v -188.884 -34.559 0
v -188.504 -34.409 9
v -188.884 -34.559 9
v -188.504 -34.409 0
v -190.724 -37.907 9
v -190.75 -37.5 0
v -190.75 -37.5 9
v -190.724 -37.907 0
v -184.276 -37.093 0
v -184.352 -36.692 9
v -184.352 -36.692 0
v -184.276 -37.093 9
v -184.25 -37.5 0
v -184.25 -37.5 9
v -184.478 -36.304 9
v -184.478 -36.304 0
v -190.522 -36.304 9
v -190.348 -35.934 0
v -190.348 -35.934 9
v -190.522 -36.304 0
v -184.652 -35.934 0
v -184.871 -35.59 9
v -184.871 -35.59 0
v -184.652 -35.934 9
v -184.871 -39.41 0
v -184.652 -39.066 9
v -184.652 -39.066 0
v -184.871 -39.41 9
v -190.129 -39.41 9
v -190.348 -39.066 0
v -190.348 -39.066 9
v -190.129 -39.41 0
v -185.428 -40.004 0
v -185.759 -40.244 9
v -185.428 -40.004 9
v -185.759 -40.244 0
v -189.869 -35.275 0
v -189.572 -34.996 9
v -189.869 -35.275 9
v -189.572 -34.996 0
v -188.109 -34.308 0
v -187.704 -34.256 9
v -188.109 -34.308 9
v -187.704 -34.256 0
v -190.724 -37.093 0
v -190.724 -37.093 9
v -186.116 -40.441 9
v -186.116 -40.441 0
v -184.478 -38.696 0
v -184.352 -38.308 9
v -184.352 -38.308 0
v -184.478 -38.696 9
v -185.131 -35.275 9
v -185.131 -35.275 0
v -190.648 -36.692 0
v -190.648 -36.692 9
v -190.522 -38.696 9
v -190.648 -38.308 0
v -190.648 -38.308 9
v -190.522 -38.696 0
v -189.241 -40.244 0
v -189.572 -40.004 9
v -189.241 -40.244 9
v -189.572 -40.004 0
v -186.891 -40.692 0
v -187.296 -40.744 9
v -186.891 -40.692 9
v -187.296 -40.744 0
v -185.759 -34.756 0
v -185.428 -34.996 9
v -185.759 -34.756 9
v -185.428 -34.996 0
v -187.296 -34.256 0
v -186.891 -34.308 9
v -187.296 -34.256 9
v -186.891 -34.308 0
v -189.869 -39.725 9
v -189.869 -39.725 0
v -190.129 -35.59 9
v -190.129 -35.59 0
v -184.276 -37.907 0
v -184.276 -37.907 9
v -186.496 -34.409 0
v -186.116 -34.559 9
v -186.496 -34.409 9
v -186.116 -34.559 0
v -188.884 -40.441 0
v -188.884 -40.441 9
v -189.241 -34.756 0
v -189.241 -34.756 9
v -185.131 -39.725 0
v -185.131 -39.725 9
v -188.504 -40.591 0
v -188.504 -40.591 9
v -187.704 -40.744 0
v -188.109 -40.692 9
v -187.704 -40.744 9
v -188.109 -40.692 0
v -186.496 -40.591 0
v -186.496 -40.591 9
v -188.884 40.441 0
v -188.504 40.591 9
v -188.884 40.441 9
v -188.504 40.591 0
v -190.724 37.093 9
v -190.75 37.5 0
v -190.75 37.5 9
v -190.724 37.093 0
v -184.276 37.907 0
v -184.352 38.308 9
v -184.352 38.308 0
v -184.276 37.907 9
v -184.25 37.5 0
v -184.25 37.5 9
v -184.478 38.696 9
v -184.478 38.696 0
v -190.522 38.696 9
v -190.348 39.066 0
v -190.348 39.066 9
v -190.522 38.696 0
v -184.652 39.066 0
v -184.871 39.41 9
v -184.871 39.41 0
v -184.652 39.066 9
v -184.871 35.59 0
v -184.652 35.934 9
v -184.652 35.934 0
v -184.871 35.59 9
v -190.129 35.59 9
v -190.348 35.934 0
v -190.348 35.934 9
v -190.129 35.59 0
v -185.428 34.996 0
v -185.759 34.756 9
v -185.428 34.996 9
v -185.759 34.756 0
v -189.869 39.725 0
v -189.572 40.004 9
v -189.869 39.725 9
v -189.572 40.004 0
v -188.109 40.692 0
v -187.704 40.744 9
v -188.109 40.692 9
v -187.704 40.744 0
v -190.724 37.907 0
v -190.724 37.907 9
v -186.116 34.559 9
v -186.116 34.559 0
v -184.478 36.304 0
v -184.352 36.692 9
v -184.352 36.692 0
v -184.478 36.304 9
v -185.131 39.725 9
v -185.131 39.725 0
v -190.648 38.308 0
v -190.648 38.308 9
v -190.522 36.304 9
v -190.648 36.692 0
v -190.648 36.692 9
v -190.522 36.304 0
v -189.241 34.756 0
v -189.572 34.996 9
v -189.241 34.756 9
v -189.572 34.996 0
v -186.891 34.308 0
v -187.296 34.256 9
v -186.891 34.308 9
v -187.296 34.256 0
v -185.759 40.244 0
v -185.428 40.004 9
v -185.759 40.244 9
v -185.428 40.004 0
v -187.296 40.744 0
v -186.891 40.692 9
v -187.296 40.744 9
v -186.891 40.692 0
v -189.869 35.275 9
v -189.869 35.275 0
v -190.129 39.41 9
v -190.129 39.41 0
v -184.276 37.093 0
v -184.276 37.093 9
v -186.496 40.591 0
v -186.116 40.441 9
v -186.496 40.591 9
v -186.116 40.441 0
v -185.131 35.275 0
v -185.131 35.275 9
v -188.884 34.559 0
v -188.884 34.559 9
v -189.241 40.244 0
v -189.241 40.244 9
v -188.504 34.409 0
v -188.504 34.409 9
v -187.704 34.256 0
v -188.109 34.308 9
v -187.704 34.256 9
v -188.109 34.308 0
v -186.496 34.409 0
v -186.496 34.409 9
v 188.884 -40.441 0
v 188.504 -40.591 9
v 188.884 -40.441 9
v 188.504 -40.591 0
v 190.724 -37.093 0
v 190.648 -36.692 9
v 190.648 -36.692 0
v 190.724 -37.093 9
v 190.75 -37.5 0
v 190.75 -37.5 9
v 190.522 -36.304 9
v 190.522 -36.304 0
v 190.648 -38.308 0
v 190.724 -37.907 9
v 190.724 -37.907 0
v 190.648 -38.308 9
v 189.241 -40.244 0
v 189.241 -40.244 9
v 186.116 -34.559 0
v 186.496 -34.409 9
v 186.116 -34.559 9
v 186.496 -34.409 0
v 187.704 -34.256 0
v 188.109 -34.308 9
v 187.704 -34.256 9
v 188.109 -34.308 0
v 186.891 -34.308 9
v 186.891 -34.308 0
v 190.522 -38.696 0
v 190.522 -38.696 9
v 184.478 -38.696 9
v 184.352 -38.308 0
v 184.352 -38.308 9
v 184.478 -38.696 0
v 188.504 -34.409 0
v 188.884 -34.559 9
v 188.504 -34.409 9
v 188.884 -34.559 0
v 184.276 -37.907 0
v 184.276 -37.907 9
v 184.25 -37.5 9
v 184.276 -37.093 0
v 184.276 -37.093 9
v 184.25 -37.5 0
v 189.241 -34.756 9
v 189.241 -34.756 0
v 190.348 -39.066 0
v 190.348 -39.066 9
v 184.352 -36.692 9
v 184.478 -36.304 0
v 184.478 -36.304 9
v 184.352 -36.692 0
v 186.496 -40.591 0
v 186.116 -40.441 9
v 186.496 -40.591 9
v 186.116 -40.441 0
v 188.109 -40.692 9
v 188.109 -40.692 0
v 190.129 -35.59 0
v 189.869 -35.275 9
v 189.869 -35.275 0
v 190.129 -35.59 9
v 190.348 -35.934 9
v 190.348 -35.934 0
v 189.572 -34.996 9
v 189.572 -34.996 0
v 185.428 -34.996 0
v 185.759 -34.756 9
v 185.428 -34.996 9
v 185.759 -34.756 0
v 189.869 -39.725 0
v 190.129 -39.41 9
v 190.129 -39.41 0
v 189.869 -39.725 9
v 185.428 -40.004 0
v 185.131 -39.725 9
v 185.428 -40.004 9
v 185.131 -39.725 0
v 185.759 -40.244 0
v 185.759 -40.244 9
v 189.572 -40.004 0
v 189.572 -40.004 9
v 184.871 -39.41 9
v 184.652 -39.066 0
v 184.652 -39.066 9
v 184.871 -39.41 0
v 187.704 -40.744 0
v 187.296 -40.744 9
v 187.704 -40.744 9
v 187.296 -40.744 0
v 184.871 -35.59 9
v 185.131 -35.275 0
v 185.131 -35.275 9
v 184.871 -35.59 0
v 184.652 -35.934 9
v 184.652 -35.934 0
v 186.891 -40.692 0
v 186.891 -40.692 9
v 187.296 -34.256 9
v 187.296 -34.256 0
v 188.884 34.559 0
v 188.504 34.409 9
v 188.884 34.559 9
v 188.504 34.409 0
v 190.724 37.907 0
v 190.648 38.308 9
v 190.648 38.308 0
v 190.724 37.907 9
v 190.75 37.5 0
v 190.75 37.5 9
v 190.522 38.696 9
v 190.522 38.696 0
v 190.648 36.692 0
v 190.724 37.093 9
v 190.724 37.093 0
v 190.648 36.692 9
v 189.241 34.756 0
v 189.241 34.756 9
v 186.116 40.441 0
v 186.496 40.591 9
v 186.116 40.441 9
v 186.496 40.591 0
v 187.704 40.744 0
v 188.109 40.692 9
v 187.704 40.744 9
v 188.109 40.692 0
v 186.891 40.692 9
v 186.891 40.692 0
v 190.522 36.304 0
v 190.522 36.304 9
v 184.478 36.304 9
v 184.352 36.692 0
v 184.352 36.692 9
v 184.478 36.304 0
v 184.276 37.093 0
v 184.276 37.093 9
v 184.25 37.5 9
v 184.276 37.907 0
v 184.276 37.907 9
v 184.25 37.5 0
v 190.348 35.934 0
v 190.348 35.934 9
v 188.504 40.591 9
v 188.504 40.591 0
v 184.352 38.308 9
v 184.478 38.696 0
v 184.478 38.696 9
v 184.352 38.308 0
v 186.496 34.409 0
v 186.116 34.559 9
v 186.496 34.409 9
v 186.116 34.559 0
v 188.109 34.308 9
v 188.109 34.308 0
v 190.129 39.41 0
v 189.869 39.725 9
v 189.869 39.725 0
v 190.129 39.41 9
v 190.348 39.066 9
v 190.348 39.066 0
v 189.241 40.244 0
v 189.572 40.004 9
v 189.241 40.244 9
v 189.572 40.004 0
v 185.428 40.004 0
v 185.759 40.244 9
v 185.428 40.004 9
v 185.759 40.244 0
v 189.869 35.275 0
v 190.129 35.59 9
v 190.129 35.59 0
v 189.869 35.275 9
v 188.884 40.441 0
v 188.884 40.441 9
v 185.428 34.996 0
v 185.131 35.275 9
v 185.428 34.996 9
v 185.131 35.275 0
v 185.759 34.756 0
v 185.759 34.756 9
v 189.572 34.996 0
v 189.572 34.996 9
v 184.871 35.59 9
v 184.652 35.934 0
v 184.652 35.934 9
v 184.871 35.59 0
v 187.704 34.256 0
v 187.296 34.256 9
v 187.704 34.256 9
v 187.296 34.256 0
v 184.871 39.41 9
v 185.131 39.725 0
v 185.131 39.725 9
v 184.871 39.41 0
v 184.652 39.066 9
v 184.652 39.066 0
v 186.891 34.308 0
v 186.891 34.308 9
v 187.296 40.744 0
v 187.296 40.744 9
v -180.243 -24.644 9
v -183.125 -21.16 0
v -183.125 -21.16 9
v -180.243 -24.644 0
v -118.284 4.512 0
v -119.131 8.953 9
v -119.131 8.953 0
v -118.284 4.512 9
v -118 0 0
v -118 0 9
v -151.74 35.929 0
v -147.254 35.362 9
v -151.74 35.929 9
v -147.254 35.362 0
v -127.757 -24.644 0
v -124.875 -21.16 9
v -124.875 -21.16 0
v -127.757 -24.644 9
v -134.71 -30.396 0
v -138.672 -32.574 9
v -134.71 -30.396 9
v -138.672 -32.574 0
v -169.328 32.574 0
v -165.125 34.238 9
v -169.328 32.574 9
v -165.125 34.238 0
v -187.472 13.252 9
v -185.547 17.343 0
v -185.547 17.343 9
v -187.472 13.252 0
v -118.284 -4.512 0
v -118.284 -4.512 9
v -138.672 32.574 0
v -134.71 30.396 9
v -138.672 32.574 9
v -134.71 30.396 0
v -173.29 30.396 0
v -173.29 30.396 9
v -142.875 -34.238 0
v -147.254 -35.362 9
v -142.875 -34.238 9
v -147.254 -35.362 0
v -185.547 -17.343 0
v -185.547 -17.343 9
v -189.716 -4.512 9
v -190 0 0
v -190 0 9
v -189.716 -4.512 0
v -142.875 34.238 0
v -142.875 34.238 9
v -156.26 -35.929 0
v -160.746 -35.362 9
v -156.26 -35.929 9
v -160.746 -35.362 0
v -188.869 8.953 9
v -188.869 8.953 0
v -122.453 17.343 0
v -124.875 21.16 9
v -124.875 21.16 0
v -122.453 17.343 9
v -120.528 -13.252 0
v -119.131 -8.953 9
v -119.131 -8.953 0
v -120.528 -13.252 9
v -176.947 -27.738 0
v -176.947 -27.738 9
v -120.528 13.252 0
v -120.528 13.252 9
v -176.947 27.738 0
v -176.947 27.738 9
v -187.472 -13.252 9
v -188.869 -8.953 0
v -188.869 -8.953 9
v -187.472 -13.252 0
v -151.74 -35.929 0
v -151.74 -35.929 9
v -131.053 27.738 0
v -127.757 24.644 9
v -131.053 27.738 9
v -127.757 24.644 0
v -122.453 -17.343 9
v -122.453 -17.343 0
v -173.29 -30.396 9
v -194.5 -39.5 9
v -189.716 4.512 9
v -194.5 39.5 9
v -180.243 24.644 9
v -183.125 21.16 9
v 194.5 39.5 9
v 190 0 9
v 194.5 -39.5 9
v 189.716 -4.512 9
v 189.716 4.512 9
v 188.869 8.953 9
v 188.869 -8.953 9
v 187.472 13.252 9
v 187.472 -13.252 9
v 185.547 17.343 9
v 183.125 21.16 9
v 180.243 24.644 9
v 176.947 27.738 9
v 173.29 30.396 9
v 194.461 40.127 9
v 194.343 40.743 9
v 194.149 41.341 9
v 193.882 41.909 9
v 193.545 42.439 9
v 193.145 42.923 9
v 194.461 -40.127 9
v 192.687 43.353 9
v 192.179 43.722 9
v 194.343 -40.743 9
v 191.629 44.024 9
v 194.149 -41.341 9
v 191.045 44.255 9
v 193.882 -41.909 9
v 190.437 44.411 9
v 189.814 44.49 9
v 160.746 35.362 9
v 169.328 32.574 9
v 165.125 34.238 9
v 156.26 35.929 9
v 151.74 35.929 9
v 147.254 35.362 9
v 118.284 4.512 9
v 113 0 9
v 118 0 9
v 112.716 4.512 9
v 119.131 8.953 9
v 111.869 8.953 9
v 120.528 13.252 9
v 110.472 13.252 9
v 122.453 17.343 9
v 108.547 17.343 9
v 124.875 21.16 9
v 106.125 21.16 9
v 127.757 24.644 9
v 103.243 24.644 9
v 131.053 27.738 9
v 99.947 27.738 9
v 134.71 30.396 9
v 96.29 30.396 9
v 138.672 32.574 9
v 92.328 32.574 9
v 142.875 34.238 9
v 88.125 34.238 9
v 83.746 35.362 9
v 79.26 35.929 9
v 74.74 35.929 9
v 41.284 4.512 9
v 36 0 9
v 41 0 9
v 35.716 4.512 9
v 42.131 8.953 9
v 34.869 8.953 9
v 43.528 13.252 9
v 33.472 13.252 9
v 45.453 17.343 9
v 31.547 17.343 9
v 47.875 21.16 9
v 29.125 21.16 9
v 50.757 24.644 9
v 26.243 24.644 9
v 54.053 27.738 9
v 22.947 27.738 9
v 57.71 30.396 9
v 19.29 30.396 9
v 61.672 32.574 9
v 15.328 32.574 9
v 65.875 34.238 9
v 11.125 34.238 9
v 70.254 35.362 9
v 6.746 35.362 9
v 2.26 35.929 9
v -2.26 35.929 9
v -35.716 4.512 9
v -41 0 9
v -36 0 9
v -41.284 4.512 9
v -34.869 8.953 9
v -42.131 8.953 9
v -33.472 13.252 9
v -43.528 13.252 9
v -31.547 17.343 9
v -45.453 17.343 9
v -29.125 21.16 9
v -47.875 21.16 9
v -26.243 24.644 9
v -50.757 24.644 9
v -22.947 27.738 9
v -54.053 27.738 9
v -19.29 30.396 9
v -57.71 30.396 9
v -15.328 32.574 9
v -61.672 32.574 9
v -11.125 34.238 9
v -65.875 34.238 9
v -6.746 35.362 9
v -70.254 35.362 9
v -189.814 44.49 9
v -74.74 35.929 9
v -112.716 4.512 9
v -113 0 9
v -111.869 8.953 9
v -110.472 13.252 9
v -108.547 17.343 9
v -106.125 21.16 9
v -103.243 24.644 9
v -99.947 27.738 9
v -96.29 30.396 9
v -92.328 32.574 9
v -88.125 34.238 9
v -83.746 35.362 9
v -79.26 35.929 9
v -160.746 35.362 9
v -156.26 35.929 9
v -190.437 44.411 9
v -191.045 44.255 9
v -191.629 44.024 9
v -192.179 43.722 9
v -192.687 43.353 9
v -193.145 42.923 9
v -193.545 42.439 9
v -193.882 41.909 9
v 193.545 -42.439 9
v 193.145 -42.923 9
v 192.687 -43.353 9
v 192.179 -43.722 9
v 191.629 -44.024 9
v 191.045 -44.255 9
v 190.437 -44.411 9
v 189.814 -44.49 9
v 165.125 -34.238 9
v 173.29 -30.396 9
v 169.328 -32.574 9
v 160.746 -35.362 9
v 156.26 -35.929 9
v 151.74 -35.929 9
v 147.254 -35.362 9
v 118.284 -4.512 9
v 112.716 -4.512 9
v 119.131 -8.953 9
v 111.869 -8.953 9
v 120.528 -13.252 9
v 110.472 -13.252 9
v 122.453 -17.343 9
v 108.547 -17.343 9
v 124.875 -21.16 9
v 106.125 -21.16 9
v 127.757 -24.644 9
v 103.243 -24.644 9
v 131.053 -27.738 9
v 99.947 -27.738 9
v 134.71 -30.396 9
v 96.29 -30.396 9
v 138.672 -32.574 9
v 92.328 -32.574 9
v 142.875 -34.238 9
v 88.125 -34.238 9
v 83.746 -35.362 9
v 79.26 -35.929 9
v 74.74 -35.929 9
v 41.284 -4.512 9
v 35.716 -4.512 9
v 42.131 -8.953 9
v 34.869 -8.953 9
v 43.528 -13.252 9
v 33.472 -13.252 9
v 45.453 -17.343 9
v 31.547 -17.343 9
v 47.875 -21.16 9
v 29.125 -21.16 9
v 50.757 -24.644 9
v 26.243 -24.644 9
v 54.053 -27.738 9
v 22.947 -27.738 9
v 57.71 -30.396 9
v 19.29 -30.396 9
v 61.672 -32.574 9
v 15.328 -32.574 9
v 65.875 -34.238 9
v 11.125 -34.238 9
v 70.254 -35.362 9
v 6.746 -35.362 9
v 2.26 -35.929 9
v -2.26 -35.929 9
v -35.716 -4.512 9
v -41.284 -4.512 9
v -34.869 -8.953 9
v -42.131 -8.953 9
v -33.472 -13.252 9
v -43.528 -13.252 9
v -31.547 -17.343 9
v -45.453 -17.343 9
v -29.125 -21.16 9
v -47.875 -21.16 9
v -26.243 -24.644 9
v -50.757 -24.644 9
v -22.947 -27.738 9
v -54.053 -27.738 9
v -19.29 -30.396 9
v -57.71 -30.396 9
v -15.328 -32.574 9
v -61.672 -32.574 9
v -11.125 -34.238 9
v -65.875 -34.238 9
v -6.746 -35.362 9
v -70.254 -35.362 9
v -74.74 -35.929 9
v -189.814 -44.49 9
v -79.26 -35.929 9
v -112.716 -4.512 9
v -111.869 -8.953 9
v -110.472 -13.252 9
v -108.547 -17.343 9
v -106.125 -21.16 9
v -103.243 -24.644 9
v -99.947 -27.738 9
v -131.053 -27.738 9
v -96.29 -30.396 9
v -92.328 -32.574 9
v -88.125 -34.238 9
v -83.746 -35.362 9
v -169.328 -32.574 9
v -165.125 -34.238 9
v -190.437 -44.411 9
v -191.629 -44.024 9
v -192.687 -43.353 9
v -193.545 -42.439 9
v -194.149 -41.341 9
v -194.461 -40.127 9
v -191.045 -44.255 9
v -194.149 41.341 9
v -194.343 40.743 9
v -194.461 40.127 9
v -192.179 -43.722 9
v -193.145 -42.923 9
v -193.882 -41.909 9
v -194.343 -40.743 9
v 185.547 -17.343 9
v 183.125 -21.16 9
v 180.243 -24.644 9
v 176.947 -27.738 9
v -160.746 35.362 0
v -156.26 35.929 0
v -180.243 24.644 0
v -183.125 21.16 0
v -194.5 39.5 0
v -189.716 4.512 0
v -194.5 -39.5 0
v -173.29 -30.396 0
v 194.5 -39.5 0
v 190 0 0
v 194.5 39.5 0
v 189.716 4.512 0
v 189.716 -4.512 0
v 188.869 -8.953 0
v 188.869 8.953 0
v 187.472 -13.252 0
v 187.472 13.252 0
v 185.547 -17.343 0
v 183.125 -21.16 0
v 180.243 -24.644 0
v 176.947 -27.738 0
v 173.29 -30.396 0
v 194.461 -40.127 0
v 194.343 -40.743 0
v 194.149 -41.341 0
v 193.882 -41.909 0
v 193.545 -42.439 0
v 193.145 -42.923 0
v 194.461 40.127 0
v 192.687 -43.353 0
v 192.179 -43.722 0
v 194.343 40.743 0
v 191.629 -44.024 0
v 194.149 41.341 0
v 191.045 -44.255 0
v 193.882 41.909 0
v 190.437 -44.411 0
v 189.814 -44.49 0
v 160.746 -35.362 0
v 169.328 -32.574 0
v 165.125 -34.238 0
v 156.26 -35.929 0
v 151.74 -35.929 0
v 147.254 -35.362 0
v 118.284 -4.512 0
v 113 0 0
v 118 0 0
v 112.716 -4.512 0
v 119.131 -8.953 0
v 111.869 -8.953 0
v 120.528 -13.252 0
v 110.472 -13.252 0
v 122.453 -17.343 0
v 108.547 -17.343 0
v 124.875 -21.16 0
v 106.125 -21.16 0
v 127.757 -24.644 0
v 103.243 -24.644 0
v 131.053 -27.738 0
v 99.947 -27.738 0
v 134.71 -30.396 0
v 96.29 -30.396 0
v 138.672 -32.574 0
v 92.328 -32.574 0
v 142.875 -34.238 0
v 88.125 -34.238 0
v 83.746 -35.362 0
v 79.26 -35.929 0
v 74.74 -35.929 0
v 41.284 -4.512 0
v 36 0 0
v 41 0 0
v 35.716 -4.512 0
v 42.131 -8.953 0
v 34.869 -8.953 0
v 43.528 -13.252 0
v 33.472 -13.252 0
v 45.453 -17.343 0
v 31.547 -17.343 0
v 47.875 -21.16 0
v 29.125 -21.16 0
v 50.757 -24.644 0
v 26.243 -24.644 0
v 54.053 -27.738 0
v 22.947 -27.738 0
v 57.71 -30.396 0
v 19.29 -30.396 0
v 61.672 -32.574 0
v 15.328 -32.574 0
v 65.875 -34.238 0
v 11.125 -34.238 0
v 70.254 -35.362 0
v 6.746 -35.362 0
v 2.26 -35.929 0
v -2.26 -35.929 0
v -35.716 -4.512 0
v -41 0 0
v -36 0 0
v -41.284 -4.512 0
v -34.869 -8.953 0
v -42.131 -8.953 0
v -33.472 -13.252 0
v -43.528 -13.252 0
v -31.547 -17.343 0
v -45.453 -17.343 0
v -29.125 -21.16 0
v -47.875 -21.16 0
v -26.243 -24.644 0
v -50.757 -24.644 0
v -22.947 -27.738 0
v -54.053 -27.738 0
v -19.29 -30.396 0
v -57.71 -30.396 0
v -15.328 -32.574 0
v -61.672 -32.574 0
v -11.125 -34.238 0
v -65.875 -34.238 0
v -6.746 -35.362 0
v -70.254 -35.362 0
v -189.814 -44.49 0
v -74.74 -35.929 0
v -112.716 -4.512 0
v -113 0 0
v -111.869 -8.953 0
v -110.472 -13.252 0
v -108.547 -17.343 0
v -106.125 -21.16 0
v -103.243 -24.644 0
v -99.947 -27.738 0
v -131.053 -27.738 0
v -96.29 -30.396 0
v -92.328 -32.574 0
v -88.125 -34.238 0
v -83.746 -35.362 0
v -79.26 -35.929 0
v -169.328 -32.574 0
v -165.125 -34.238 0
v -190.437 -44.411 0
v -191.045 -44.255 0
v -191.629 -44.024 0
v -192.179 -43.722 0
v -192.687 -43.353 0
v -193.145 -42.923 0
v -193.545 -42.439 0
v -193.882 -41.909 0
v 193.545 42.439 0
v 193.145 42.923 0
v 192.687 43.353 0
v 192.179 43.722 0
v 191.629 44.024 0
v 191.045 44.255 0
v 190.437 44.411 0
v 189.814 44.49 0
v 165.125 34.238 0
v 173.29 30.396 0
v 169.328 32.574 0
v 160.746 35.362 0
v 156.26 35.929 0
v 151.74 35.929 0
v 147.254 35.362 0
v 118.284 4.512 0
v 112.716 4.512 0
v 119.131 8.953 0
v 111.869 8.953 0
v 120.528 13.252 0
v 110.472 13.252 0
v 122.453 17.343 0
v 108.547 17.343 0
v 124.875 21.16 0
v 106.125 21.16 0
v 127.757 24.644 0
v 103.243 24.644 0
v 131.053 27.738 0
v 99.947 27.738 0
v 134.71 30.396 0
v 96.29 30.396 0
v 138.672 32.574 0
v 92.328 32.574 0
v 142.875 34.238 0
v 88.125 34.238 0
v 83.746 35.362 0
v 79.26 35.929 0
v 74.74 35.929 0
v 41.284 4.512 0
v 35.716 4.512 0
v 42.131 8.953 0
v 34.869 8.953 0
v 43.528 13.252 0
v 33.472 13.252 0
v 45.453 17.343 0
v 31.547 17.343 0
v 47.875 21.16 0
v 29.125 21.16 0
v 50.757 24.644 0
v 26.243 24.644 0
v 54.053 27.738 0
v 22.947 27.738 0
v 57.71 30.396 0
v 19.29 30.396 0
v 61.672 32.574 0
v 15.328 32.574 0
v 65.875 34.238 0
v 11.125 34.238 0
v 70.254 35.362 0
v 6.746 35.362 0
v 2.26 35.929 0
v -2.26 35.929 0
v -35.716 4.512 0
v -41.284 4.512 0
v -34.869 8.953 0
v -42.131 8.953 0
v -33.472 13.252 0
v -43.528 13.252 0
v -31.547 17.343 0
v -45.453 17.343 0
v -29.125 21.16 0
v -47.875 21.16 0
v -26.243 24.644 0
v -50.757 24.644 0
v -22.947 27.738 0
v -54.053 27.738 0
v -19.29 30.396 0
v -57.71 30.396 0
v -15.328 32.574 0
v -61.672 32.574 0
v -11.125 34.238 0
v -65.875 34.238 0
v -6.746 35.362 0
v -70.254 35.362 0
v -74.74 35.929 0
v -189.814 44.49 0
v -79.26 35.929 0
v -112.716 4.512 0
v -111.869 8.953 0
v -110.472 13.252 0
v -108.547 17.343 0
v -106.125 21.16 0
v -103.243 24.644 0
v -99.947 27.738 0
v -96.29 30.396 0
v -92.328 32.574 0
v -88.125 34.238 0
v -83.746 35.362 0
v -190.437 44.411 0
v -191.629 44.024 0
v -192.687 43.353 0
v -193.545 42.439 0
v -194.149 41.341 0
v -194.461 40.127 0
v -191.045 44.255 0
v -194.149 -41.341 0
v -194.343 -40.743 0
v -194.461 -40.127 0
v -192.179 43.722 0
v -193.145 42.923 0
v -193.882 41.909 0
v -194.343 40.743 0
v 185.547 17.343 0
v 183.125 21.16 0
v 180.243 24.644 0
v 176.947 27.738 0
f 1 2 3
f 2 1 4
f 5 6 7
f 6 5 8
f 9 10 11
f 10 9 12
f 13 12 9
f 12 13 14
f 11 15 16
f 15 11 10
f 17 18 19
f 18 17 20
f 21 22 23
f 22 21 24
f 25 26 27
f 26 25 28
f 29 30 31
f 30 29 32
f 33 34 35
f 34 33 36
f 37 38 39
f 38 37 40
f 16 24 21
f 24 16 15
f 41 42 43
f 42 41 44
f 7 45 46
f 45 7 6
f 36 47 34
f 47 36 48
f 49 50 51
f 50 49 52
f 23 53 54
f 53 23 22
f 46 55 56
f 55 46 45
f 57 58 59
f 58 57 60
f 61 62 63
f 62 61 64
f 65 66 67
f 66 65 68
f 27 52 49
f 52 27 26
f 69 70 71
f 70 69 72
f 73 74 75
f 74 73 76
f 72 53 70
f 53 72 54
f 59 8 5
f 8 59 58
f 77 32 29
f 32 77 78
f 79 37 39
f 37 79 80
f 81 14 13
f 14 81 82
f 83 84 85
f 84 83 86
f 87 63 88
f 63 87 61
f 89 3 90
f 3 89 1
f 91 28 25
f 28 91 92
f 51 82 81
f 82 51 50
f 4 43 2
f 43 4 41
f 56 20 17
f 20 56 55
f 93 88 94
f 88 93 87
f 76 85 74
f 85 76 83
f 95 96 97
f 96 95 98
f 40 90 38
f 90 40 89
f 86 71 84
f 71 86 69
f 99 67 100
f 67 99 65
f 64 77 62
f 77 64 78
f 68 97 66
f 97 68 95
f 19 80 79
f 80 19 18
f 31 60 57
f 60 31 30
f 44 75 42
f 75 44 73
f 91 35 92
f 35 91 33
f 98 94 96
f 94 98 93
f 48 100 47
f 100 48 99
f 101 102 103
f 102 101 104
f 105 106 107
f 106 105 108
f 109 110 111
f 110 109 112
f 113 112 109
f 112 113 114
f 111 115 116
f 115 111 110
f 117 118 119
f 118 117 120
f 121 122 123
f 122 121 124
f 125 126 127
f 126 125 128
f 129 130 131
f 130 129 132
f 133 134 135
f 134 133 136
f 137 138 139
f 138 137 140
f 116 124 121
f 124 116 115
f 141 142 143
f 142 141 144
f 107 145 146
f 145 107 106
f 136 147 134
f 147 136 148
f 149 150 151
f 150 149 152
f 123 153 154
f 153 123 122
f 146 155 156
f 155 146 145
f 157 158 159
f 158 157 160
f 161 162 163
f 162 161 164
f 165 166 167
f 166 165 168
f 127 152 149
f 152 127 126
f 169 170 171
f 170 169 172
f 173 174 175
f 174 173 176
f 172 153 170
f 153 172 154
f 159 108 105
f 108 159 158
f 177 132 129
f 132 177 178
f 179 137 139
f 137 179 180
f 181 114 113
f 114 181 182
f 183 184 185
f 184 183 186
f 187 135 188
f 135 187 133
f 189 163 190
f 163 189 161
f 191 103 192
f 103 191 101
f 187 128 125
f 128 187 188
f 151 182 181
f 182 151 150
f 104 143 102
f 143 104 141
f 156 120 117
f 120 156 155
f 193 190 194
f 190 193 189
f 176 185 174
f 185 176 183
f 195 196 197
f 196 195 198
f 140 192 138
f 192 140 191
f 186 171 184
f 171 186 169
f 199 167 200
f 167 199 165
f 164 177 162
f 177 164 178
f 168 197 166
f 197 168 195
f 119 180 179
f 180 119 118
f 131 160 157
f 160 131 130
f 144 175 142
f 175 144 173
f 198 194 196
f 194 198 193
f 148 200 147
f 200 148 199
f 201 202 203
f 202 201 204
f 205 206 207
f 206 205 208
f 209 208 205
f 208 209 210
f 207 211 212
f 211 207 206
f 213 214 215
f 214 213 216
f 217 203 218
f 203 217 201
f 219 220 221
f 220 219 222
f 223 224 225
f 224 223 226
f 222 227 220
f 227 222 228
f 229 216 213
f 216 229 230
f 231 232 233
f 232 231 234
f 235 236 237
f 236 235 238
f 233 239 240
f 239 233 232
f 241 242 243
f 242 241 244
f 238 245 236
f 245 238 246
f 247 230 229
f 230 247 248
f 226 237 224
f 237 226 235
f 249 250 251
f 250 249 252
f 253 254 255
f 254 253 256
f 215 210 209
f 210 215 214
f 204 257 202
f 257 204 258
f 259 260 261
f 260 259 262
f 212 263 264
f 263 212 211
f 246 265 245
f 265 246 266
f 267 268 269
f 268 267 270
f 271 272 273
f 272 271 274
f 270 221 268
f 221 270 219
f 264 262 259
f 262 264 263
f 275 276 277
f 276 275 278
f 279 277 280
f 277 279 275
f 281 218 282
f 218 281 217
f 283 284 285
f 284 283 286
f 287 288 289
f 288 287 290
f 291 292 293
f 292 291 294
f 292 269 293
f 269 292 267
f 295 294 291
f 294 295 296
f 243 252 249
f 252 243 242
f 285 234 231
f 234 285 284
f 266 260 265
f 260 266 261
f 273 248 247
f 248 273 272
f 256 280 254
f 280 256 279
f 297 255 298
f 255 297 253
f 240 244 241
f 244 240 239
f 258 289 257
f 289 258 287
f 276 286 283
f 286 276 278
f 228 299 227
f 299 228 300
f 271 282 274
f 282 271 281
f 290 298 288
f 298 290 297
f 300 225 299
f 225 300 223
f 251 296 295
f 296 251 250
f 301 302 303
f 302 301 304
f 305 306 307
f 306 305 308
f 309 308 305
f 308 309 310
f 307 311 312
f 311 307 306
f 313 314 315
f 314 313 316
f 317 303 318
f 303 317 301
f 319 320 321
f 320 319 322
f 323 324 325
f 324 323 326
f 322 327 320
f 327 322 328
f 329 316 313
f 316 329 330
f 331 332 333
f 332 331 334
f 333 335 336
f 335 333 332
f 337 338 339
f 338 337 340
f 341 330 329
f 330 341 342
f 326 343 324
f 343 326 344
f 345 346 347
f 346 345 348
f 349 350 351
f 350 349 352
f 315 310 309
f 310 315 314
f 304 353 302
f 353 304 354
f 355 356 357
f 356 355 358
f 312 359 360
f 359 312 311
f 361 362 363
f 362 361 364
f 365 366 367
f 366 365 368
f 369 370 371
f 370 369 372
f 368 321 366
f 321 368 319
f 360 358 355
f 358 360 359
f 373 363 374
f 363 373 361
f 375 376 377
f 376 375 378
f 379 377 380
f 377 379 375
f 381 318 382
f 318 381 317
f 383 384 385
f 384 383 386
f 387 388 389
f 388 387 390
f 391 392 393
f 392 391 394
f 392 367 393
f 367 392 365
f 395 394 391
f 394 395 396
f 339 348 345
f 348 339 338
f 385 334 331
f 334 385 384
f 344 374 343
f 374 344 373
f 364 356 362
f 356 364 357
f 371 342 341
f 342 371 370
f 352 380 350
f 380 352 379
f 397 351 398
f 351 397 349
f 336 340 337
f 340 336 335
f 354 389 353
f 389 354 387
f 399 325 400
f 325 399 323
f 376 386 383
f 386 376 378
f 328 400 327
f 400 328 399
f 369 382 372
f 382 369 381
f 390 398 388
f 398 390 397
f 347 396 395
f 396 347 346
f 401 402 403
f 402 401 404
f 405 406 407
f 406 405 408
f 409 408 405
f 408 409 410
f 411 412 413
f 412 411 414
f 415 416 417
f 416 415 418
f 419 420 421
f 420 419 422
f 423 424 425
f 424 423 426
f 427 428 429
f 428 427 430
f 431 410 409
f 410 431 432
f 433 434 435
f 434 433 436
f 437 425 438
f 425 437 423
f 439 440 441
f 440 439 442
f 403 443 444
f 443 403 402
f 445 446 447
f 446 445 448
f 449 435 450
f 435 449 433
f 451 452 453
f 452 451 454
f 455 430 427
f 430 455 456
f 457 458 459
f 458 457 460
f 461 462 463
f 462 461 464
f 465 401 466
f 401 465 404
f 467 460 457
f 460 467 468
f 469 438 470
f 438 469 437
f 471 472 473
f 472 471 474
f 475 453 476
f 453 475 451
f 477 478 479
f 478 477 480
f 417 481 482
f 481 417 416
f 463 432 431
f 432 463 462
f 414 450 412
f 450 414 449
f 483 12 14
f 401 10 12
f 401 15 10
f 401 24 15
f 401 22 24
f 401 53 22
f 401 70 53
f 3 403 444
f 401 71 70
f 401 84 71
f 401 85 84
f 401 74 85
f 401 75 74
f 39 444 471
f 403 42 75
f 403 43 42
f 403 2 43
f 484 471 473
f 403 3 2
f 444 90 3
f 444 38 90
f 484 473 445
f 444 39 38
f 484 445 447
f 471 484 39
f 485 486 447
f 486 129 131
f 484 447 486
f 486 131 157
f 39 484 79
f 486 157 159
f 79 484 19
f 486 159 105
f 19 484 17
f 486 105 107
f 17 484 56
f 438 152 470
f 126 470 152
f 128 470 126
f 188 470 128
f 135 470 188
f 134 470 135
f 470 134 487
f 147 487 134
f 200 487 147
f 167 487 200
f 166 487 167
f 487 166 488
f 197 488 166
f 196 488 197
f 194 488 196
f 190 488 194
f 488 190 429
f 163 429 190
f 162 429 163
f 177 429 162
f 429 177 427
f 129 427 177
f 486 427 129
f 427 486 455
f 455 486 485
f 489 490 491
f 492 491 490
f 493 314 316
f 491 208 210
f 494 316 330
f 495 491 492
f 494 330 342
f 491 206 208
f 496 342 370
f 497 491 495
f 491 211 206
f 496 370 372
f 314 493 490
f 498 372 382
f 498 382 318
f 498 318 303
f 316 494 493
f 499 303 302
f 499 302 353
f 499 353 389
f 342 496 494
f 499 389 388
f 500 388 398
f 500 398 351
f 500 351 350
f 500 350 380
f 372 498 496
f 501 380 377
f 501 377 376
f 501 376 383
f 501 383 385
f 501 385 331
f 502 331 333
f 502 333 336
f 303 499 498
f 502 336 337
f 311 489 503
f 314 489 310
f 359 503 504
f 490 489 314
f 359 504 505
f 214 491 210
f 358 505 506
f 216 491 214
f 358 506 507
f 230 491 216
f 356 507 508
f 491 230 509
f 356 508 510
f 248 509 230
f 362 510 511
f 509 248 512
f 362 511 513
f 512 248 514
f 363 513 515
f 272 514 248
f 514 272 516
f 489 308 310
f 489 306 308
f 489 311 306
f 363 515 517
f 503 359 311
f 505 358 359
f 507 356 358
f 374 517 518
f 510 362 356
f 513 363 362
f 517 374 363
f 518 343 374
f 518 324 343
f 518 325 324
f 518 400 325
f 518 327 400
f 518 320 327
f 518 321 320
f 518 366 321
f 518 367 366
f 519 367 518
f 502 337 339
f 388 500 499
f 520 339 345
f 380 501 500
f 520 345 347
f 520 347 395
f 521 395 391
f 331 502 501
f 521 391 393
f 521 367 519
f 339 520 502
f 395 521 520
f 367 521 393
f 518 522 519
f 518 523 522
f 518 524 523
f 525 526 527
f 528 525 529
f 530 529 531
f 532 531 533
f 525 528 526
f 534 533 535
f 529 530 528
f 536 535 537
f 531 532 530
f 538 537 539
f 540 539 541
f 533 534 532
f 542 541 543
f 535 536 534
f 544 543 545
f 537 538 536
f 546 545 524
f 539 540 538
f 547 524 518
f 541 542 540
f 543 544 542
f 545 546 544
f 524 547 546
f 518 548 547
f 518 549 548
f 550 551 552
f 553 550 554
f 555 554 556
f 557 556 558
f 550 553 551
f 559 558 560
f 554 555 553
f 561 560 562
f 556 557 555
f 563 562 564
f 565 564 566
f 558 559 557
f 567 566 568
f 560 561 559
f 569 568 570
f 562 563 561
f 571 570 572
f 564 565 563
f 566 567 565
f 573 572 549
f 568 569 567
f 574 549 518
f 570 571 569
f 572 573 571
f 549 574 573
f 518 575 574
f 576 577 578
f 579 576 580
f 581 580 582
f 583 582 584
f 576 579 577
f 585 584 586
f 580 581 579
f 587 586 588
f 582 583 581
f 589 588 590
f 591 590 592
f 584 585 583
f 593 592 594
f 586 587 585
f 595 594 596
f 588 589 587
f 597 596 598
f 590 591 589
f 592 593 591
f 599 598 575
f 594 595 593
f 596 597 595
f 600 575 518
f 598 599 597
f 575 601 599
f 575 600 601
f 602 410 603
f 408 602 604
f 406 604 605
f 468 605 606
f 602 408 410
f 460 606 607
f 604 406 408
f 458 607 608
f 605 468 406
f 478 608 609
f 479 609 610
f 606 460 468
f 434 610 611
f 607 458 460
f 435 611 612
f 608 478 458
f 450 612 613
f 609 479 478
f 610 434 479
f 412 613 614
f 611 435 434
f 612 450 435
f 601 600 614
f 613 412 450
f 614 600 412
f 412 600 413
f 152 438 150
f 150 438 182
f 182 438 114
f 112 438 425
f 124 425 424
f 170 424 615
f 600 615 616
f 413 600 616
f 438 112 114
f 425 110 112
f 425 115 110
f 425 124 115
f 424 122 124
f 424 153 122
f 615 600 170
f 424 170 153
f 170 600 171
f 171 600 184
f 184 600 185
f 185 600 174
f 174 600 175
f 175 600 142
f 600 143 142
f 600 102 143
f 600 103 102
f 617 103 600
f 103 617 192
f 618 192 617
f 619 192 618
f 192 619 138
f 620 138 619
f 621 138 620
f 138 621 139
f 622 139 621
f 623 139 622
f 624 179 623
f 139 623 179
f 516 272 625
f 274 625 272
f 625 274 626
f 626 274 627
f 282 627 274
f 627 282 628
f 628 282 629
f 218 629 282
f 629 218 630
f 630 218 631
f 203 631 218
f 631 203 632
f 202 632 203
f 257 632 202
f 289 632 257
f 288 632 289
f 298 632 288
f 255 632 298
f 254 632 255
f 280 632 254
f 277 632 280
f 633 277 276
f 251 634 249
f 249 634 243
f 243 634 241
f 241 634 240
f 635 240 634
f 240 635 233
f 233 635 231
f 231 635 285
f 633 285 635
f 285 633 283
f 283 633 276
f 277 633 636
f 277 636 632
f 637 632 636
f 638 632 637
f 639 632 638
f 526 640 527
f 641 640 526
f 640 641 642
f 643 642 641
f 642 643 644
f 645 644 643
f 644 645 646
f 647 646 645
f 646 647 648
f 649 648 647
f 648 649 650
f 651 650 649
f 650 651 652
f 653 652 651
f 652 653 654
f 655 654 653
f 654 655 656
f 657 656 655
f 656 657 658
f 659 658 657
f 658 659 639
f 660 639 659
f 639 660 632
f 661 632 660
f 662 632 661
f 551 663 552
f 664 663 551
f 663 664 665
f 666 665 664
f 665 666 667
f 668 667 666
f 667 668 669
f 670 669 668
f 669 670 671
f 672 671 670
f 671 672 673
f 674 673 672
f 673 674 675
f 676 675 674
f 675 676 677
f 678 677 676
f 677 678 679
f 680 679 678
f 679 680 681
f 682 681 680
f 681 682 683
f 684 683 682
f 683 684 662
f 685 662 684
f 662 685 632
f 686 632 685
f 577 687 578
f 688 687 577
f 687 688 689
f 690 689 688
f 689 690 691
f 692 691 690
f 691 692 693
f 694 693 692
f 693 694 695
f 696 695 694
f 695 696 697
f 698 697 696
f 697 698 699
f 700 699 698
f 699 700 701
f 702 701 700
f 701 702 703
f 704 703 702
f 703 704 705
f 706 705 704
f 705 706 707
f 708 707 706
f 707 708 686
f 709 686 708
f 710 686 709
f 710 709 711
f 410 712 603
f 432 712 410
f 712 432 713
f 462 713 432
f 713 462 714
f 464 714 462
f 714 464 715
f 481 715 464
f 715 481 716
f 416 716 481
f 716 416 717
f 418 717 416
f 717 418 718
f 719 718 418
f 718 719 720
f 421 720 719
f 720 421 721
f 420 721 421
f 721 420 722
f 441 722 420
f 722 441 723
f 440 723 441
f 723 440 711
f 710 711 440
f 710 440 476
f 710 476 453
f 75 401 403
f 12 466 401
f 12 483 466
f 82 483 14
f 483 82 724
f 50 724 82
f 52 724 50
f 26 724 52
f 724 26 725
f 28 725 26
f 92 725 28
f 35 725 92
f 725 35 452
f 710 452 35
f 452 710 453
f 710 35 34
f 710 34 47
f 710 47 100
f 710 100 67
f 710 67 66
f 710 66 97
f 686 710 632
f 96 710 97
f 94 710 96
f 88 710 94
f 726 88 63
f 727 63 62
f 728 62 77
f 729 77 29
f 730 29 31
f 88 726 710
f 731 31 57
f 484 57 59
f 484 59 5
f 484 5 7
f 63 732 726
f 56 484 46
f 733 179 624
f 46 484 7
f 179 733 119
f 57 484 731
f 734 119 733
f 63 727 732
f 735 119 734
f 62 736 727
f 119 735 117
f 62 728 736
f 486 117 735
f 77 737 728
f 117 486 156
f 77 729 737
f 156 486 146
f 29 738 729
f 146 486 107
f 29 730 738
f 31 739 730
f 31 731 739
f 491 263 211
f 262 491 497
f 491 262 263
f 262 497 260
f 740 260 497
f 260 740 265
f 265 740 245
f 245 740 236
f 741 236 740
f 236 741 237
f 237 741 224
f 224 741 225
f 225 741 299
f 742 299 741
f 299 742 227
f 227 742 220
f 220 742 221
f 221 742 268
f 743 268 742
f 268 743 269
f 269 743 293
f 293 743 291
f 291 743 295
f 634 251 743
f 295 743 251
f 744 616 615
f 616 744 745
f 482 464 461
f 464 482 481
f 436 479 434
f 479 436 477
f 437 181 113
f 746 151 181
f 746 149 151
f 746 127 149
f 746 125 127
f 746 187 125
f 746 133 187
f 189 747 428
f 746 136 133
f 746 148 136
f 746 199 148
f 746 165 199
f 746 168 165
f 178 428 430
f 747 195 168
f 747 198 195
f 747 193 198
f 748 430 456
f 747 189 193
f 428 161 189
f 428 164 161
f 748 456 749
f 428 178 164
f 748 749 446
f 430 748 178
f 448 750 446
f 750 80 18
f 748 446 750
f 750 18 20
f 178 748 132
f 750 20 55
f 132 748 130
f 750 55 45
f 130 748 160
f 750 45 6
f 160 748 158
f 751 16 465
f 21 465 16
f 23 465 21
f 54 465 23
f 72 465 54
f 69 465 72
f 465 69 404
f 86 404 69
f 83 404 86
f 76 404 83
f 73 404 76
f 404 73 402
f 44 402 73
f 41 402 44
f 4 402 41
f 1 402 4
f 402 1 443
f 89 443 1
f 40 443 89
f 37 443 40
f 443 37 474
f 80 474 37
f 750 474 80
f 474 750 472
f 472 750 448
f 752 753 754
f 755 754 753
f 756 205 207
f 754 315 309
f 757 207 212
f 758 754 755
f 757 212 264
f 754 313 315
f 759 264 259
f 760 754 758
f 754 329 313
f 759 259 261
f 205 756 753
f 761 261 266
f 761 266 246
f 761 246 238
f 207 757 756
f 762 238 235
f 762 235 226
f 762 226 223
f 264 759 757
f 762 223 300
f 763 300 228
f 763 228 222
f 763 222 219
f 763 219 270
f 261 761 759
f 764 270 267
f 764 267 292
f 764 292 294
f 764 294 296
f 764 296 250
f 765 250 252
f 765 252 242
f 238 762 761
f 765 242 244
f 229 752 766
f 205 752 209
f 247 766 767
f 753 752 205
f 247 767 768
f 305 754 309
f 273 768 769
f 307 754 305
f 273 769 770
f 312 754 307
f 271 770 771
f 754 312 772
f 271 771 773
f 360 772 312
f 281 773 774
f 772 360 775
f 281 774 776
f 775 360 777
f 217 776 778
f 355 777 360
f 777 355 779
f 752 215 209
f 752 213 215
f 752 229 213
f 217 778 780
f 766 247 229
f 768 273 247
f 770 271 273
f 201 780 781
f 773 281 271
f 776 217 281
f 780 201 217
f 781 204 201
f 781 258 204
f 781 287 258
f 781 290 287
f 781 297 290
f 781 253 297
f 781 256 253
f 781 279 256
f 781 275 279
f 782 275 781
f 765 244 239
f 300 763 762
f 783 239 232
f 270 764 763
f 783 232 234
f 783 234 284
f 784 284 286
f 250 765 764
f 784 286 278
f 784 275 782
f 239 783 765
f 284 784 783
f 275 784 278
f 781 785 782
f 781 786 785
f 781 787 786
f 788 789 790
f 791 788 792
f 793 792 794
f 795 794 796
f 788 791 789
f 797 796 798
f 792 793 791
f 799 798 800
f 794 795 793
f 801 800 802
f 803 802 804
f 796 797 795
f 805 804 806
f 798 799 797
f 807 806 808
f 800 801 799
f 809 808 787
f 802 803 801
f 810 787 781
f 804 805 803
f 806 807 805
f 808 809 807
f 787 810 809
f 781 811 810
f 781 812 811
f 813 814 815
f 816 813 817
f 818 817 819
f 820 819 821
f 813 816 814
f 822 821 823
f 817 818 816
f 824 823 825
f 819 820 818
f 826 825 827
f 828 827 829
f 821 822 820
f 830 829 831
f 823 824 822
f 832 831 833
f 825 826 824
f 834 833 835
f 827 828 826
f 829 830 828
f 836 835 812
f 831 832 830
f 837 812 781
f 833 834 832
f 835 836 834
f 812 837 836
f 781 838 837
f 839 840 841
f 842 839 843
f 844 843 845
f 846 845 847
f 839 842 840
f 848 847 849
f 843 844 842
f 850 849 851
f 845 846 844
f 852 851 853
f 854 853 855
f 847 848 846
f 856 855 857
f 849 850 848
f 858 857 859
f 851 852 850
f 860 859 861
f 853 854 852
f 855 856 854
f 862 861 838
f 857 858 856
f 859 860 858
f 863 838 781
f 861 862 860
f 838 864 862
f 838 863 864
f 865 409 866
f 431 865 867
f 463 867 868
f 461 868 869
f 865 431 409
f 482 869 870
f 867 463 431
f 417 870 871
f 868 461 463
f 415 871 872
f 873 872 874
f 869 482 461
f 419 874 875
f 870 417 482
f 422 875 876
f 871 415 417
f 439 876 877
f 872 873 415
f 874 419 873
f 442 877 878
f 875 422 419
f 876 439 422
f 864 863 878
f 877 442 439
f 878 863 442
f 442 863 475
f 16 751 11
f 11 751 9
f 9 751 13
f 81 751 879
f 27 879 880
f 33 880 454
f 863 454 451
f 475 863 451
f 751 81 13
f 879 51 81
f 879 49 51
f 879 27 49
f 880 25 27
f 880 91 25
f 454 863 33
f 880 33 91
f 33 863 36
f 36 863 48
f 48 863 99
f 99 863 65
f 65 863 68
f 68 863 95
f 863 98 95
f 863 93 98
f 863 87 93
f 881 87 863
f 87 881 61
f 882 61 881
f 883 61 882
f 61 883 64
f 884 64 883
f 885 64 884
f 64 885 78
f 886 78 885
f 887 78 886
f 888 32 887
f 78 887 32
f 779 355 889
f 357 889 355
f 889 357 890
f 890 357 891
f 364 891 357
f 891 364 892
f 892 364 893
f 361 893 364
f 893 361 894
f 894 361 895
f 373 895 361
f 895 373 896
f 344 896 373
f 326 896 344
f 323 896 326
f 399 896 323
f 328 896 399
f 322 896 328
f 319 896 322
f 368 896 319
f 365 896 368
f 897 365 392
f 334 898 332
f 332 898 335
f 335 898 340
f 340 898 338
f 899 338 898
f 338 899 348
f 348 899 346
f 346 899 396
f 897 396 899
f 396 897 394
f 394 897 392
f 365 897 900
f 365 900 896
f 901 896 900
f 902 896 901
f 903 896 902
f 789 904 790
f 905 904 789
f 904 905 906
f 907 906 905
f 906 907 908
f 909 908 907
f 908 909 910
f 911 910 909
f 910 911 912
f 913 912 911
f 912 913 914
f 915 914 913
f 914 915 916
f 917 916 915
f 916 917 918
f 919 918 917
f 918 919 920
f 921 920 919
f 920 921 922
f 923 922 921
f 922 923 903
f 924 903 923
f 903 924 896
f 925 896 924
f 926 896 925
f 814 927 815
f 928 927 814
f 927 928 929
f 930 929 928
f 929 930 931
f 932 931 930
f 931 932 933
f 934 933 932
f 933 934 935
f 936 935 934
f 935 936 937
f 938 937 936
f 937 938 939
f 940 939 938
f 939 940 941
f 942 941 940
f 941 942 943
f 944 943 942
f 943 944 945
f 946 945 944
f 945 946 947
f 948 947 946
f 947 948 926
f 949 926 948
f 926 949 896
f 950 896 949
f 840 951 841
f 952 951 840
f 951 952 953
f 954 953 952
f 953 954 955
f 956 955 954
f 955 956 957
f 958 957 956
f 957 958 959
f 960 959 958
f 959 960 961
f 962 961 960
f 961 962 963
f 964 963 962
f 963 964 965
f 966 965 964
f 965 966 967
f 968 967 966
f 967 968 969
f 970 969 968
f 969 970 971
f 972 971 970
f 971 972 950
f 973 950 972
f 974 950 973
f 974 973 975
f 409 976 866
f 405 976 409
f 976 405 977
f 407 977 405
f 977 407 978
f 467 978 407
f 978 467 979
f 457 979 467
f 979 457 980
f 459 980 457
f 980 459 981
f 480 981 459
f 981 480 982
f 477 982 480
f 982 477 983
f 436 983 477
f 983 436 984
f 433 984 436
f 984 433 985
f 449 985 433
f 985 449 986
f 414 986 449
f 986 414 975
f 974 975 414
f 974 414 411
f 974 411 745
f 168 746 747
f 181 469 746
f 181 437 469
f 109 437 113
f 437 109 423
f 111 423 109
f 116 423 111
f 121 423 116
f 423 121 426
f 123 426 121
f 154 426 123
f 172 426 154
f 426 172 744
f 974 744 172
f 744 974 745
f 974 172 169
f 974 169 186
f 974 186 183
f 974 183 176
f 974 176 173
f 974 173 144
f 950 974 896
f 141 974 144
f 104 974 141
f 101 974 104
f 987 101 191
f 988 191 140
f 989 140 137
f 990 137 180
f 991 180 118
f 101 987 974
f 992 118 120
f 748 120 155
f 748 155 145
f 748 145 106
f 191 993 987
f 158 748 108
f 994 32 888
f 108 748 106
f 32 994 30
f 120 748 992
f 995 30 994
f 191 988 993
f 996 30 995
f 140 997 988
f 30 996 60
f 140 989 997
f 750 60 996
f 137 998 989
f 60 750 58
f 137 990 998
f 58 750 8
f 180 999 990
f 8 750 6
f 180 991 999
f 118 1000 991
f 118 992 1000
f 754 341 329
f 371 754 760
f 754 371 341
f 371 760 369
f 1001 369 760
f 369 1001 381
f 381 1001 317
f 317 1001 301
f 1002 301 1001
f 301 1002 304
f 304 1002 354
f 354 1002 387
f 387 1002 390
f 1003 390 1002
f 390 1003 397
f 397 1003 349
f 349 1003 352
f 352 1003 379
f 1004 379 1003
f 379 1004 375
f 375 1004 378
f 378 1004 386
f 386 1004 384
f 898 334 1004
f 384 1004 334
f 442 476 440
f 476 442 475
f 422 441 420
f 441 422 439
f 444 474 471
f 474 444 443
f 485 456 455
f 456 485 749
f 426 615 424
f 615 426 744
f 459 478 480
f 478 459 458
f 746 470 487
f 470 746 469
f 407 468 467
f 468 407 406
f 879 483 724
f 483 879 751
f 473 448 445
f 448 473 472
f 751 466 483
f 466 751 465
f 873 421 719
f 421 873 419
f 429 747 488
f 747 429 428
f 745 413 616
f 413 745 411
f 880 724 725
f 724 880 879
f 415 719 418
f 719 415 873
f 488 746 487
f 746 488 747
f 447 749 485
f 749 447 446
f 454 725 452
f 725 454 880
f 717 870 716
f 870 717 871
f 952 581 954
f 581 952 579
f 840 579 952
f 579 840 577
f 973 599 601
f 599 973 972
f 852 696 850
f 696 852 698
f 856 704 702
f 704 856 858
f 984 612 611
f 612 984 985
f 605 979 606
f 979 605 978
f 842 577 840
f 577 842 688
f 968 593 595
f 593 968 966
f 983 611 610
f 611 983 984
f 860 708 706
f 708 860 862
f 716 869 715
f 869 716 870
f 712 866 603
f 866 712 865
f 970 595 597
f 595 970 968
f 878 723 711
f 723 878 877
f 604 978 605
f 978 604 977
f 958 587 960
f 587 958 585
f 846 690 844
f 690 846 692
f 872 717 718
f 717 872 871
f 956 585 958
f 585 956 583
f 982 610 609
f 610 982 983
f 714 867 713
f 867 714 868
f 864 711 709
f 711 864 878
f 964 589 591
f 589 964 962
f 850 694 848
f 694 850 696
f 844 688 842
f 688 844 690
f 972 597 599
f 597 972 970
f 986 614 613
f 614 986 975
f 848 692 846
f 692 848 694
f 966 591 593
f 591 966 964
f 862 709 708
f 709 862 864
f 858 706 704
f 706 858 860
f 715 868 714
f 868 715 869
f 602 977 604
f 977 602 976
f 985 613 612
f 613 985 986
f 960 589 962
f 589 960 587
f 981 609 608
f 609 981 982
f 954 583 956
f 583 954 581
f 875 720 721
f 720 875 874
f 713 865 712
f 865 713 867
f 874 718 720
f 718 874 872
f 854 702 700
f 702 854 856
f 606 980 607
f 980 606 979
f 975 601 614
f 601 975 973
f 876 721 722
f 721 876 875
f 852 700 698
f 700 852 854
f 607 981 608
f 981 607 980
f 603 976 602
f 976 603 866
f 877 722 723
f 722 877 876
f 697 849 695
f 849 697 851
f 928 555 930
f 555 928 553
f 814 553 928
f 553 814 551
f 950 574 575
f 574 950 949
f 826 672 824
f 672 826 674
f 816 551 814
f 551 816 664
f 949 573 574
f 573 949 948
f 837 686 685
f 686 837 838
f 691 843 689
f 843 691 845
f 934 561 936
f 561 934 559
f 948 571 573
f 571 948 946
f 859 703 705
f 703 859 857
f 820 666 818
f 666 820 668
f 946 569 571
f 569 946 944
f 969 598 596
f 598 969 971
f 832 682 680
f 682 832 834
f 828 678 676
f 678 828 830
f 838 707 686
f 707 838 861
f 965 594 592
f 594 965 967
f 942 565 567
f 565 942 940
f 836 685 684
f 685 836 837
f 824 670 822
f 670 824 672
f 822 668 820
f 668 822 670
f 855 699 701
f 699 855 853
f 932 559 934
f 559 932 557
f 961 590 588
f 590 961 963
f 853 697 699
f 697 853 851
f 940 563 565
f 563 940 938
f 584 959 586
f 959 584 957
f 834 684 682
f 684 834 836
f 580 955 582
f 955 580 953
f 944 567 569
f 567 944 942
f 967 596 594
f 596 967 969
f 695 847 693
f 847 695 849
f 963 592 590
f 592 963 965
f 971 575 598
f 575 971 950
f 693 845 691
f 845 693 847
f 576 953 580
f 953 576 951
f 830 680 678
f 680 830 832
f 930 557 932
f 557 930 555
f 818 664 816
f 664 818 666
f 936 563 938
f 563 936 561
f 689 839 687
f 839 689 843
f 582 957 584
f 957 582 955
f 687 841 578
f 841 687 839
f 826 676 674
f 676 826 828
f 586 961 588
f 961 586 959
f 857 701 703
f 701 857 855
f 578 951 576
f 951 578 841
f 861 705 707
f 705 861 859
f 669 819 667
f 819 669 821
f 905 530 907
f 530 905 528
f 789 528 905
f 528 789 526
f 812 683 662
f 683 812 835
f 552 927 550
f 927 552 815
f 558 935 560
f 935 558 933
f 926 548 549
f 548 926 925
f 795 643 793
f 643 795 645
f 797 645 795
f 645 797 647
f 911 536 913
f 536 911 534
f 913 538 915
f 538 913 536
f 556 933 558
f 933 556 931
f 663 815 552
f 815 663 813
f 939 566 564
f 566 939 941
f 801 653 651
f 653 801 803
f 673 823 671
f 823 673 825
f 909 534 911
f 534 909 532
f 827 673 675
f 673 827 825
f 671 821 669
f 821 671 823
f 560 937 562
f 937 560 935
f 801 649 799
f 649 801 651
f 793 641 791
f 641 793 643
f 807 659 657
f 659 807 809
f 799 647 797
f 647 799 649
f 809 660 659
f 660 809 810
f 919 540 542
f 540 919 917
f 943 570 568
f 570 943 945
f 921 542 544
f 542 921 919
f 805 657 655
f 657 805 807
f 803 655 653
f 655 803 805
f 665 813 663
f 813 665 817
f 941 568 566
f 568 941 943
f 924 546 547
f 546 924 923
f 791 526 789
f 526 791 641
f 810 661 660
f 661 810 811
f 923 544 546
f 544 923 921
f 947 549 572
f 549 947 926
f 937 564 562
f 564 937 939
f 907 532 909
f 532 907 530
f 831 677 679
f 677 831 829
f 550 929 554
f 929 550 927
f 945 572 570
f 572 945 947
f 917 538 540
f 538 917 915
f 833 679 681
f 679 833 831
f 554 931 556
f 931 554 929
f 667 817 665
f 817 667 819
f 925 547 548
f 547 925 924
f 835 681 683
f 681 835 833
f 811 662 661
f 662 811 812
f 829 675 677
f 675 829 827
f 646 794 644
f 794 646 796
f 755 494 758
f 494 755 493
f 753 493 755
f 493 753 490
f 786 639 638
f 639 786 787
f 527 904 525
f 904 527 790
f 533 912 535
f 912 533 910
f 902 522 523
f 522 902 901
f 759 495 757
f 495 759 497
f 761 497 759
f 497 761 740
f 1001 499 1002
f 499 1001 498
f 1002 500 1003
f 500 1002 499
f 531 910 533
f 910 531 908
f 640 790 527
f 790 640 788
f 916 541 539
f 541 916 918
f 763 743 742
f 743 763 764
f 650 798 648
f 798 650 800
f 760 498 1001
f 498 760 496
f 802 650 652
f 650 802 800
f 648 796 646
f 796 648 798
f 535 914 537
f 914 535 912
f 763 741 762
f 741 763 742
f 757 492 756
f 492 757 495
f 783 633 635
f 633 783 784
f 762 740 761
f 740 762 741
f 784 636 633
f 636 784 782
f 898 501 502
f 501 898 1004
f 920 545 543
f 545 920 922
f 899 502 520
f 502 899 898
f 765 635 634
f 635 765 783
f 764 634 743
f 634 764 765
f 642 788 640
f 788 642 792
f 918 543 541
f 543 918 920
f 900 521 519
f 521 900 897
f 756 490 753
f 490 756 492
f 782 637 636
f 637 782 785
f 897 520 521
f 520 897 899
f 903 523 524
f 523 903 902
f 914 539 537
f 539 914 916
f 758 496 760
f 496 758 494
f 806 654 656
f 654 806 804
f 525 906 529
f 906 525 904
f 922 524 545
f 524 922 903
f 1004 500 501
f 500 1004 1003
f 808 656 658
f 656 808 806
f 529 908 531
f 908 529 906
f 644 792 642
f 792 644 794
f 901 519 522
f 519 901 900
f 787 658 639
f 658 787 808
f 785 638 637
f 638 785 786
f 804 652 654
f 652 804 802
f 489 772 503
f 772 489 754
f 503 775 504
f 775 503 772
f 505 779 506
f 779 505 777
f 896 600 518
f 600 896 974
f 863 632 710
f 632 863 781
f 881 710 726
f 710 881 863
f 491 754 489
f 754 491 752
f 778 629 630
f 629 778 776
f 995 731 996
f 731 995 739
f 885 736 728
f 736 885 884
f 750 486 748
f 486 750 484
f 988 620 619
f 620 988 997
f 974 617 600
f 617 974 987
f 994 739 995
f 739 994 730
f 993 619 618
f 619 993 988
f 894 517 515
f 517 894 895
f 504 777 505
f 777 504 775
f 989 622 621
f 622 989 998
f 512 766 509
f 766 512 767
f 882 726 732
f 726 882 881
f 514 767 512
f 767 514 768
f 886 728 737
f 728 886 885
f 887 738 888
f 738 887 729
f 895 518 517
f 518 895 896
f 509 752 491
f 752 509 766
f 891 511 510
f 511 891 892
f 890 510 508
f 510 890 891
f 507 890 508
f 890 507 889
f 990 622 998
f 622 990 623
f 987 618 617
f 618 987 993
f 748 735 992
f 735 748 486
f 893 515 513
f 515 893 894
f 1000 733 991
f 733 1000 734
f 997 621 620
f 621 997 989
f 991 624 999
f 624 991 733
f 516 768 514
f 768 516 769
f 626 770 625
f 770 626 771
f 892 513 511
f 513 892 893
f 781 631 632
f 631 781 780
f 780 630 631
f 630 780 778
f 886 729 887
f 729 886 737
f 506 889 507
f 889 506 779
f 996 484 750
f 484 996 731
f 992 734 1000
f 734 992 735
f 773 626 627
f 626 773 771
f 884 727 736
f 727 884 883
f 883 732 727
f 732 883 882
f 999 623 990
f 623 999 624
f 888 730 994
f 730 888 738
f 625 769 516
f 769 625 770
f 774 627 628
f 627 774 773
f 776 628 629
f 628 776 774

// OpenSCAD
$fn = 50;


difference() {
	union() {
		hull() {
			translate(v = [-189.5000000000, 39.5000000000, 0]) {
				cylinder(h = 9, r = 5);
			}
			translate(v = [189.5000000000, 39.5000000000, 0]) {
				cylinder(h = 9, r = 5);
			}
			translate(v = [-189.5000000000, -39.5000000000, 0]) {
				cylinder(h = 9, r = 5);
			}
			translate(v = [189.5000000000, -39.5000000000, 0]) {
				cylinder(h = 9, r = 5);
			}
		}
	}
	union() {
		#translate(v = [-187.5000000000, -37.5000000000, -100.0000000000]) {
			cylinder(h = 200, r = 3.2500000000);
		}
		#translate(v = [-187.5000000000, 37.5000000000, -100.0000000000]) {
			cylinder(h = 200, r = 3.2500000000);
		}
		#translate(v = [187.5000000000, -37.5000000000, -100.0000000000]) {
			cylinder(h = 200, r = 3.2500000000);
		}
		#translate(v = [187.5000000000, 37.5000000000, -100.0000000000]) {
			cylinder(h = 200, r = 3.2500000000);
		}
		#translate(v = [-154.0000000000, 0, 0]) {
			cylinder(h = 9, r = 36.0000000000);
		}
		#translate(v = [-77.0000000000, 0, 0]) {
			cylinder(h = 9, r = 36.0000000000);
		}
		#cylinder(h = 9, r = 36.0000000000);
		#translate(v = [77.0000000000, 0, 0]) {
			cylinder(h = 9, r = 36.0000000000);
		}
		#translate(v = [154.0000000000, 0, 0]) {
			cylinder(h = 9, r = 36.0000000000);
		}
	}
}
